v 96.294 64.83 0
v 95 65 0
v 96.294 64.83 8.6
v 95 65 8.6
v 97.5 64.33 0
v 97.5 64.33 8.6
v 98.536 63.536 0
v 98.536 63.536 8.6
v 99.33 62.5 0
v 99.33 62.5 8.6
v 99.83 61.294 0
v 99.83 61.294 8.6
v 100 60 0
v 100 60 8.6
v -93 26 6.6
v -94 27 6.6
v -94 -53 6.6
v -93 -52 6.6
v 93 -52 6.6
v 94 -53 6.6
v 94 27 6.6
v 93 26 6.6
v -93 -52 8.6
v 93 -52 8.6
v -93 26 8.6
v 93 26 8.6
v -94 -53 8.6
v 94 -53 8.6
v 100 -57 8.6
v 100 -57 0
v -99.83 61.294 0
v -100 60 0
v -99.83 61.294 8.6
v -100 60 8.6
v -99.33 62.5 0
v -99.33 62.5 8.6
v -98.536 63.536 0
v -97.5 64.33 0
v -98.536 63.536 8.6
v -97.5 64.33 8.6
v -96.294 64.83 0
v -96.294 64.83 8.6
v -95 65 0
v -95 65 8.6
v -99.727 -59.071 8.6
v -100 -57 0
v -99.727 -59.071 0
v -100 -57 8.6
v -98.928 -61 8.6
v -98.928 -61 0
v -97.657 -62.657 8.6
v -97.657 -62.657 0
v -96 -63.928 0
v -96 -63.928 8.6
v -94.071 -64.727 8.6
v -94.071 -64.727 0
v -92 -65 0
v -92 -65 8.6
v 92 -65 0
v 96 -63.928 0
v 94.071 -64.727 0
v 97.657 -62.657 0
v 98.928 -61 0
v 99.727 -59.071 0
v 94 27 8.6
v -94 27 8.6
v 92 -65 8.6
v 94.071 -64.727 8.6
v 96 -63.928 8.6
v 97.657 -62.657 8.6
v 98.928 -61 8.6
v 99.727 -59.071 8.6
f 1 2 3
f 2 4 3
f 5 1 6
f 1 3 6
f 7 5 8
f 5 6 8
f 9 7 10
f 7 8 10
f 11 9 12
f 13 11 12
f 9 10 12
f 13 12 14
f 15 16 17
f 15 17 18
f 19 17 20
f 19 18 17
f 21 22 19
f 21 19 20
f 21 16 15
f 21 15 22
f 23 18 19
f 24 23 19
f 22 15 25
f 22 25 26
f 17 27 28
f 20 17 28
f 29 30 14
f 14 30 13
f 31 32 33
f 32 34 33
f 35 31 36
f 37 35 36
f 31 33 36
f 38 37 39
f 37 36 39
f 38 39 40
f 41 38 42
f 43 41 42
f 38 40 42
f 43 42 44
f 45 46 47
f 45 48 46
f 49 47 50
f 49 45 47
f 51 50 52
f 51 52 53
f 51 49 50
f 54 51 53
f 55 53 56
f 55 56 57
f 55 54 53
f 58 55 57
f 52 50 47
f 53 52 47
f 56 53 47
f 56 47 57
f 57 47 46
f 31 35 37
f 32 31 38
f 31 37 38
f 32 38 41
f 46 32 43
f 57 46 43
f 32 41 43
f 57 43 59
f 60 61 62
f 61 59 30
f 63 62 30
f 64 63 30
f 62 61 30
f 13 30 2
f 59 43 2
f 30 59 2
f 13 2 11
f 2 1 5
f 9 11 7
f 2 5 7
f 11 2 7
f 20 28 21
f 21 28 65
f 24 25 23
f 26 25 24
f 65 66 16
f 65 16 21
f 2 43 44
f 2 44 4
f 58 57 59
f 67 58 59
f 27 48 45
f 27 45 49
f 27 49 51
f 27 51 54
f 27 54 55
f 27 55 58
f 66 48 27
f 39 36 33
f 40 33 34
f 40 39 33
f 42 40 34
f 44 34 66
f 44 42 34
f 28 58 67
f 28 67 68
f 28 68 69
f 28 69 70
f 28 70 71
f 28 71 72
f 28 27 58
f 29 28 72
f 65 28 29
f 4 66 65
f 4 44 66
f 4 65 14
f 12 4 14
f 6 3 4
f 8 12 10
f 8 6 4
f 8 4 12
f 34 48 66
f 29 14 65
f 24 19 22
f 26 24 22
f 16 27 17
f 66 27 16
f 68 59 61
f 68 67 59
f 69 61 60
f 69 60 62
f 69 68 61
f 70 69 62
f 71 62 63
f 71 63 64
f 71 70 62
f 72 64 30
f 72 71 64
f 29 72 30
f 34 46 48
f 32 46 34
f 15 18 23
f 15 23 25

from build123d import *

# Parameters (mm, degrees)
F0_W     = 200
F0_H     = 130
F1_DEPTH = 8.6
F2_R     = 8
F3_R     = 5
F4_W     = 188
F4_H     = 80
F5_DEPTH = 2
F6_W     = 186
F6_H     = 78
F7_DEPTH = 2


with BuildPart() as f1:
    # F0 (on Top) → F1 (new body)
    with BuildSketch(Plane.XY):
        Rectangle(F0_W, F0_H)
    extrude(amount=F1_DEPTH)

    # F2
    f2_edges = [f1.edges().sort_by_distance(p)[0] for p in [
        (-100, -65, 4.3),
        (100, -65, 4.3),
    ]]
    fillet(f2_edges, radius=F2_R)

    # F3
    f3_edges = [f1.edges().sort_by_distance(p)[0] for p in [
        (100, 65, 4.3),
        (-100, 65, 4.3),
    ]]
    fillet(f3_edges, radius=F3_R)

    # F4 (on face) → F5 (cut)
    with BuildSketch(Plane.XY.offset(8.6)):
        with Locations((0, -13)):
            Rectangle(F4_W, F4_H)
    extrude(amount=-F5_DEPTH, mode=Mode.SUBTRACT)

    # F6 (on face) → F7 (join, through all)
    with BuildSketch(Plane.XY.offset(6.6)):
        with Locations((0, -13)):
            Rectangle(F6_W, F6_H)
    extrude(amount=F7_DEPTH)


solid = f1.part
